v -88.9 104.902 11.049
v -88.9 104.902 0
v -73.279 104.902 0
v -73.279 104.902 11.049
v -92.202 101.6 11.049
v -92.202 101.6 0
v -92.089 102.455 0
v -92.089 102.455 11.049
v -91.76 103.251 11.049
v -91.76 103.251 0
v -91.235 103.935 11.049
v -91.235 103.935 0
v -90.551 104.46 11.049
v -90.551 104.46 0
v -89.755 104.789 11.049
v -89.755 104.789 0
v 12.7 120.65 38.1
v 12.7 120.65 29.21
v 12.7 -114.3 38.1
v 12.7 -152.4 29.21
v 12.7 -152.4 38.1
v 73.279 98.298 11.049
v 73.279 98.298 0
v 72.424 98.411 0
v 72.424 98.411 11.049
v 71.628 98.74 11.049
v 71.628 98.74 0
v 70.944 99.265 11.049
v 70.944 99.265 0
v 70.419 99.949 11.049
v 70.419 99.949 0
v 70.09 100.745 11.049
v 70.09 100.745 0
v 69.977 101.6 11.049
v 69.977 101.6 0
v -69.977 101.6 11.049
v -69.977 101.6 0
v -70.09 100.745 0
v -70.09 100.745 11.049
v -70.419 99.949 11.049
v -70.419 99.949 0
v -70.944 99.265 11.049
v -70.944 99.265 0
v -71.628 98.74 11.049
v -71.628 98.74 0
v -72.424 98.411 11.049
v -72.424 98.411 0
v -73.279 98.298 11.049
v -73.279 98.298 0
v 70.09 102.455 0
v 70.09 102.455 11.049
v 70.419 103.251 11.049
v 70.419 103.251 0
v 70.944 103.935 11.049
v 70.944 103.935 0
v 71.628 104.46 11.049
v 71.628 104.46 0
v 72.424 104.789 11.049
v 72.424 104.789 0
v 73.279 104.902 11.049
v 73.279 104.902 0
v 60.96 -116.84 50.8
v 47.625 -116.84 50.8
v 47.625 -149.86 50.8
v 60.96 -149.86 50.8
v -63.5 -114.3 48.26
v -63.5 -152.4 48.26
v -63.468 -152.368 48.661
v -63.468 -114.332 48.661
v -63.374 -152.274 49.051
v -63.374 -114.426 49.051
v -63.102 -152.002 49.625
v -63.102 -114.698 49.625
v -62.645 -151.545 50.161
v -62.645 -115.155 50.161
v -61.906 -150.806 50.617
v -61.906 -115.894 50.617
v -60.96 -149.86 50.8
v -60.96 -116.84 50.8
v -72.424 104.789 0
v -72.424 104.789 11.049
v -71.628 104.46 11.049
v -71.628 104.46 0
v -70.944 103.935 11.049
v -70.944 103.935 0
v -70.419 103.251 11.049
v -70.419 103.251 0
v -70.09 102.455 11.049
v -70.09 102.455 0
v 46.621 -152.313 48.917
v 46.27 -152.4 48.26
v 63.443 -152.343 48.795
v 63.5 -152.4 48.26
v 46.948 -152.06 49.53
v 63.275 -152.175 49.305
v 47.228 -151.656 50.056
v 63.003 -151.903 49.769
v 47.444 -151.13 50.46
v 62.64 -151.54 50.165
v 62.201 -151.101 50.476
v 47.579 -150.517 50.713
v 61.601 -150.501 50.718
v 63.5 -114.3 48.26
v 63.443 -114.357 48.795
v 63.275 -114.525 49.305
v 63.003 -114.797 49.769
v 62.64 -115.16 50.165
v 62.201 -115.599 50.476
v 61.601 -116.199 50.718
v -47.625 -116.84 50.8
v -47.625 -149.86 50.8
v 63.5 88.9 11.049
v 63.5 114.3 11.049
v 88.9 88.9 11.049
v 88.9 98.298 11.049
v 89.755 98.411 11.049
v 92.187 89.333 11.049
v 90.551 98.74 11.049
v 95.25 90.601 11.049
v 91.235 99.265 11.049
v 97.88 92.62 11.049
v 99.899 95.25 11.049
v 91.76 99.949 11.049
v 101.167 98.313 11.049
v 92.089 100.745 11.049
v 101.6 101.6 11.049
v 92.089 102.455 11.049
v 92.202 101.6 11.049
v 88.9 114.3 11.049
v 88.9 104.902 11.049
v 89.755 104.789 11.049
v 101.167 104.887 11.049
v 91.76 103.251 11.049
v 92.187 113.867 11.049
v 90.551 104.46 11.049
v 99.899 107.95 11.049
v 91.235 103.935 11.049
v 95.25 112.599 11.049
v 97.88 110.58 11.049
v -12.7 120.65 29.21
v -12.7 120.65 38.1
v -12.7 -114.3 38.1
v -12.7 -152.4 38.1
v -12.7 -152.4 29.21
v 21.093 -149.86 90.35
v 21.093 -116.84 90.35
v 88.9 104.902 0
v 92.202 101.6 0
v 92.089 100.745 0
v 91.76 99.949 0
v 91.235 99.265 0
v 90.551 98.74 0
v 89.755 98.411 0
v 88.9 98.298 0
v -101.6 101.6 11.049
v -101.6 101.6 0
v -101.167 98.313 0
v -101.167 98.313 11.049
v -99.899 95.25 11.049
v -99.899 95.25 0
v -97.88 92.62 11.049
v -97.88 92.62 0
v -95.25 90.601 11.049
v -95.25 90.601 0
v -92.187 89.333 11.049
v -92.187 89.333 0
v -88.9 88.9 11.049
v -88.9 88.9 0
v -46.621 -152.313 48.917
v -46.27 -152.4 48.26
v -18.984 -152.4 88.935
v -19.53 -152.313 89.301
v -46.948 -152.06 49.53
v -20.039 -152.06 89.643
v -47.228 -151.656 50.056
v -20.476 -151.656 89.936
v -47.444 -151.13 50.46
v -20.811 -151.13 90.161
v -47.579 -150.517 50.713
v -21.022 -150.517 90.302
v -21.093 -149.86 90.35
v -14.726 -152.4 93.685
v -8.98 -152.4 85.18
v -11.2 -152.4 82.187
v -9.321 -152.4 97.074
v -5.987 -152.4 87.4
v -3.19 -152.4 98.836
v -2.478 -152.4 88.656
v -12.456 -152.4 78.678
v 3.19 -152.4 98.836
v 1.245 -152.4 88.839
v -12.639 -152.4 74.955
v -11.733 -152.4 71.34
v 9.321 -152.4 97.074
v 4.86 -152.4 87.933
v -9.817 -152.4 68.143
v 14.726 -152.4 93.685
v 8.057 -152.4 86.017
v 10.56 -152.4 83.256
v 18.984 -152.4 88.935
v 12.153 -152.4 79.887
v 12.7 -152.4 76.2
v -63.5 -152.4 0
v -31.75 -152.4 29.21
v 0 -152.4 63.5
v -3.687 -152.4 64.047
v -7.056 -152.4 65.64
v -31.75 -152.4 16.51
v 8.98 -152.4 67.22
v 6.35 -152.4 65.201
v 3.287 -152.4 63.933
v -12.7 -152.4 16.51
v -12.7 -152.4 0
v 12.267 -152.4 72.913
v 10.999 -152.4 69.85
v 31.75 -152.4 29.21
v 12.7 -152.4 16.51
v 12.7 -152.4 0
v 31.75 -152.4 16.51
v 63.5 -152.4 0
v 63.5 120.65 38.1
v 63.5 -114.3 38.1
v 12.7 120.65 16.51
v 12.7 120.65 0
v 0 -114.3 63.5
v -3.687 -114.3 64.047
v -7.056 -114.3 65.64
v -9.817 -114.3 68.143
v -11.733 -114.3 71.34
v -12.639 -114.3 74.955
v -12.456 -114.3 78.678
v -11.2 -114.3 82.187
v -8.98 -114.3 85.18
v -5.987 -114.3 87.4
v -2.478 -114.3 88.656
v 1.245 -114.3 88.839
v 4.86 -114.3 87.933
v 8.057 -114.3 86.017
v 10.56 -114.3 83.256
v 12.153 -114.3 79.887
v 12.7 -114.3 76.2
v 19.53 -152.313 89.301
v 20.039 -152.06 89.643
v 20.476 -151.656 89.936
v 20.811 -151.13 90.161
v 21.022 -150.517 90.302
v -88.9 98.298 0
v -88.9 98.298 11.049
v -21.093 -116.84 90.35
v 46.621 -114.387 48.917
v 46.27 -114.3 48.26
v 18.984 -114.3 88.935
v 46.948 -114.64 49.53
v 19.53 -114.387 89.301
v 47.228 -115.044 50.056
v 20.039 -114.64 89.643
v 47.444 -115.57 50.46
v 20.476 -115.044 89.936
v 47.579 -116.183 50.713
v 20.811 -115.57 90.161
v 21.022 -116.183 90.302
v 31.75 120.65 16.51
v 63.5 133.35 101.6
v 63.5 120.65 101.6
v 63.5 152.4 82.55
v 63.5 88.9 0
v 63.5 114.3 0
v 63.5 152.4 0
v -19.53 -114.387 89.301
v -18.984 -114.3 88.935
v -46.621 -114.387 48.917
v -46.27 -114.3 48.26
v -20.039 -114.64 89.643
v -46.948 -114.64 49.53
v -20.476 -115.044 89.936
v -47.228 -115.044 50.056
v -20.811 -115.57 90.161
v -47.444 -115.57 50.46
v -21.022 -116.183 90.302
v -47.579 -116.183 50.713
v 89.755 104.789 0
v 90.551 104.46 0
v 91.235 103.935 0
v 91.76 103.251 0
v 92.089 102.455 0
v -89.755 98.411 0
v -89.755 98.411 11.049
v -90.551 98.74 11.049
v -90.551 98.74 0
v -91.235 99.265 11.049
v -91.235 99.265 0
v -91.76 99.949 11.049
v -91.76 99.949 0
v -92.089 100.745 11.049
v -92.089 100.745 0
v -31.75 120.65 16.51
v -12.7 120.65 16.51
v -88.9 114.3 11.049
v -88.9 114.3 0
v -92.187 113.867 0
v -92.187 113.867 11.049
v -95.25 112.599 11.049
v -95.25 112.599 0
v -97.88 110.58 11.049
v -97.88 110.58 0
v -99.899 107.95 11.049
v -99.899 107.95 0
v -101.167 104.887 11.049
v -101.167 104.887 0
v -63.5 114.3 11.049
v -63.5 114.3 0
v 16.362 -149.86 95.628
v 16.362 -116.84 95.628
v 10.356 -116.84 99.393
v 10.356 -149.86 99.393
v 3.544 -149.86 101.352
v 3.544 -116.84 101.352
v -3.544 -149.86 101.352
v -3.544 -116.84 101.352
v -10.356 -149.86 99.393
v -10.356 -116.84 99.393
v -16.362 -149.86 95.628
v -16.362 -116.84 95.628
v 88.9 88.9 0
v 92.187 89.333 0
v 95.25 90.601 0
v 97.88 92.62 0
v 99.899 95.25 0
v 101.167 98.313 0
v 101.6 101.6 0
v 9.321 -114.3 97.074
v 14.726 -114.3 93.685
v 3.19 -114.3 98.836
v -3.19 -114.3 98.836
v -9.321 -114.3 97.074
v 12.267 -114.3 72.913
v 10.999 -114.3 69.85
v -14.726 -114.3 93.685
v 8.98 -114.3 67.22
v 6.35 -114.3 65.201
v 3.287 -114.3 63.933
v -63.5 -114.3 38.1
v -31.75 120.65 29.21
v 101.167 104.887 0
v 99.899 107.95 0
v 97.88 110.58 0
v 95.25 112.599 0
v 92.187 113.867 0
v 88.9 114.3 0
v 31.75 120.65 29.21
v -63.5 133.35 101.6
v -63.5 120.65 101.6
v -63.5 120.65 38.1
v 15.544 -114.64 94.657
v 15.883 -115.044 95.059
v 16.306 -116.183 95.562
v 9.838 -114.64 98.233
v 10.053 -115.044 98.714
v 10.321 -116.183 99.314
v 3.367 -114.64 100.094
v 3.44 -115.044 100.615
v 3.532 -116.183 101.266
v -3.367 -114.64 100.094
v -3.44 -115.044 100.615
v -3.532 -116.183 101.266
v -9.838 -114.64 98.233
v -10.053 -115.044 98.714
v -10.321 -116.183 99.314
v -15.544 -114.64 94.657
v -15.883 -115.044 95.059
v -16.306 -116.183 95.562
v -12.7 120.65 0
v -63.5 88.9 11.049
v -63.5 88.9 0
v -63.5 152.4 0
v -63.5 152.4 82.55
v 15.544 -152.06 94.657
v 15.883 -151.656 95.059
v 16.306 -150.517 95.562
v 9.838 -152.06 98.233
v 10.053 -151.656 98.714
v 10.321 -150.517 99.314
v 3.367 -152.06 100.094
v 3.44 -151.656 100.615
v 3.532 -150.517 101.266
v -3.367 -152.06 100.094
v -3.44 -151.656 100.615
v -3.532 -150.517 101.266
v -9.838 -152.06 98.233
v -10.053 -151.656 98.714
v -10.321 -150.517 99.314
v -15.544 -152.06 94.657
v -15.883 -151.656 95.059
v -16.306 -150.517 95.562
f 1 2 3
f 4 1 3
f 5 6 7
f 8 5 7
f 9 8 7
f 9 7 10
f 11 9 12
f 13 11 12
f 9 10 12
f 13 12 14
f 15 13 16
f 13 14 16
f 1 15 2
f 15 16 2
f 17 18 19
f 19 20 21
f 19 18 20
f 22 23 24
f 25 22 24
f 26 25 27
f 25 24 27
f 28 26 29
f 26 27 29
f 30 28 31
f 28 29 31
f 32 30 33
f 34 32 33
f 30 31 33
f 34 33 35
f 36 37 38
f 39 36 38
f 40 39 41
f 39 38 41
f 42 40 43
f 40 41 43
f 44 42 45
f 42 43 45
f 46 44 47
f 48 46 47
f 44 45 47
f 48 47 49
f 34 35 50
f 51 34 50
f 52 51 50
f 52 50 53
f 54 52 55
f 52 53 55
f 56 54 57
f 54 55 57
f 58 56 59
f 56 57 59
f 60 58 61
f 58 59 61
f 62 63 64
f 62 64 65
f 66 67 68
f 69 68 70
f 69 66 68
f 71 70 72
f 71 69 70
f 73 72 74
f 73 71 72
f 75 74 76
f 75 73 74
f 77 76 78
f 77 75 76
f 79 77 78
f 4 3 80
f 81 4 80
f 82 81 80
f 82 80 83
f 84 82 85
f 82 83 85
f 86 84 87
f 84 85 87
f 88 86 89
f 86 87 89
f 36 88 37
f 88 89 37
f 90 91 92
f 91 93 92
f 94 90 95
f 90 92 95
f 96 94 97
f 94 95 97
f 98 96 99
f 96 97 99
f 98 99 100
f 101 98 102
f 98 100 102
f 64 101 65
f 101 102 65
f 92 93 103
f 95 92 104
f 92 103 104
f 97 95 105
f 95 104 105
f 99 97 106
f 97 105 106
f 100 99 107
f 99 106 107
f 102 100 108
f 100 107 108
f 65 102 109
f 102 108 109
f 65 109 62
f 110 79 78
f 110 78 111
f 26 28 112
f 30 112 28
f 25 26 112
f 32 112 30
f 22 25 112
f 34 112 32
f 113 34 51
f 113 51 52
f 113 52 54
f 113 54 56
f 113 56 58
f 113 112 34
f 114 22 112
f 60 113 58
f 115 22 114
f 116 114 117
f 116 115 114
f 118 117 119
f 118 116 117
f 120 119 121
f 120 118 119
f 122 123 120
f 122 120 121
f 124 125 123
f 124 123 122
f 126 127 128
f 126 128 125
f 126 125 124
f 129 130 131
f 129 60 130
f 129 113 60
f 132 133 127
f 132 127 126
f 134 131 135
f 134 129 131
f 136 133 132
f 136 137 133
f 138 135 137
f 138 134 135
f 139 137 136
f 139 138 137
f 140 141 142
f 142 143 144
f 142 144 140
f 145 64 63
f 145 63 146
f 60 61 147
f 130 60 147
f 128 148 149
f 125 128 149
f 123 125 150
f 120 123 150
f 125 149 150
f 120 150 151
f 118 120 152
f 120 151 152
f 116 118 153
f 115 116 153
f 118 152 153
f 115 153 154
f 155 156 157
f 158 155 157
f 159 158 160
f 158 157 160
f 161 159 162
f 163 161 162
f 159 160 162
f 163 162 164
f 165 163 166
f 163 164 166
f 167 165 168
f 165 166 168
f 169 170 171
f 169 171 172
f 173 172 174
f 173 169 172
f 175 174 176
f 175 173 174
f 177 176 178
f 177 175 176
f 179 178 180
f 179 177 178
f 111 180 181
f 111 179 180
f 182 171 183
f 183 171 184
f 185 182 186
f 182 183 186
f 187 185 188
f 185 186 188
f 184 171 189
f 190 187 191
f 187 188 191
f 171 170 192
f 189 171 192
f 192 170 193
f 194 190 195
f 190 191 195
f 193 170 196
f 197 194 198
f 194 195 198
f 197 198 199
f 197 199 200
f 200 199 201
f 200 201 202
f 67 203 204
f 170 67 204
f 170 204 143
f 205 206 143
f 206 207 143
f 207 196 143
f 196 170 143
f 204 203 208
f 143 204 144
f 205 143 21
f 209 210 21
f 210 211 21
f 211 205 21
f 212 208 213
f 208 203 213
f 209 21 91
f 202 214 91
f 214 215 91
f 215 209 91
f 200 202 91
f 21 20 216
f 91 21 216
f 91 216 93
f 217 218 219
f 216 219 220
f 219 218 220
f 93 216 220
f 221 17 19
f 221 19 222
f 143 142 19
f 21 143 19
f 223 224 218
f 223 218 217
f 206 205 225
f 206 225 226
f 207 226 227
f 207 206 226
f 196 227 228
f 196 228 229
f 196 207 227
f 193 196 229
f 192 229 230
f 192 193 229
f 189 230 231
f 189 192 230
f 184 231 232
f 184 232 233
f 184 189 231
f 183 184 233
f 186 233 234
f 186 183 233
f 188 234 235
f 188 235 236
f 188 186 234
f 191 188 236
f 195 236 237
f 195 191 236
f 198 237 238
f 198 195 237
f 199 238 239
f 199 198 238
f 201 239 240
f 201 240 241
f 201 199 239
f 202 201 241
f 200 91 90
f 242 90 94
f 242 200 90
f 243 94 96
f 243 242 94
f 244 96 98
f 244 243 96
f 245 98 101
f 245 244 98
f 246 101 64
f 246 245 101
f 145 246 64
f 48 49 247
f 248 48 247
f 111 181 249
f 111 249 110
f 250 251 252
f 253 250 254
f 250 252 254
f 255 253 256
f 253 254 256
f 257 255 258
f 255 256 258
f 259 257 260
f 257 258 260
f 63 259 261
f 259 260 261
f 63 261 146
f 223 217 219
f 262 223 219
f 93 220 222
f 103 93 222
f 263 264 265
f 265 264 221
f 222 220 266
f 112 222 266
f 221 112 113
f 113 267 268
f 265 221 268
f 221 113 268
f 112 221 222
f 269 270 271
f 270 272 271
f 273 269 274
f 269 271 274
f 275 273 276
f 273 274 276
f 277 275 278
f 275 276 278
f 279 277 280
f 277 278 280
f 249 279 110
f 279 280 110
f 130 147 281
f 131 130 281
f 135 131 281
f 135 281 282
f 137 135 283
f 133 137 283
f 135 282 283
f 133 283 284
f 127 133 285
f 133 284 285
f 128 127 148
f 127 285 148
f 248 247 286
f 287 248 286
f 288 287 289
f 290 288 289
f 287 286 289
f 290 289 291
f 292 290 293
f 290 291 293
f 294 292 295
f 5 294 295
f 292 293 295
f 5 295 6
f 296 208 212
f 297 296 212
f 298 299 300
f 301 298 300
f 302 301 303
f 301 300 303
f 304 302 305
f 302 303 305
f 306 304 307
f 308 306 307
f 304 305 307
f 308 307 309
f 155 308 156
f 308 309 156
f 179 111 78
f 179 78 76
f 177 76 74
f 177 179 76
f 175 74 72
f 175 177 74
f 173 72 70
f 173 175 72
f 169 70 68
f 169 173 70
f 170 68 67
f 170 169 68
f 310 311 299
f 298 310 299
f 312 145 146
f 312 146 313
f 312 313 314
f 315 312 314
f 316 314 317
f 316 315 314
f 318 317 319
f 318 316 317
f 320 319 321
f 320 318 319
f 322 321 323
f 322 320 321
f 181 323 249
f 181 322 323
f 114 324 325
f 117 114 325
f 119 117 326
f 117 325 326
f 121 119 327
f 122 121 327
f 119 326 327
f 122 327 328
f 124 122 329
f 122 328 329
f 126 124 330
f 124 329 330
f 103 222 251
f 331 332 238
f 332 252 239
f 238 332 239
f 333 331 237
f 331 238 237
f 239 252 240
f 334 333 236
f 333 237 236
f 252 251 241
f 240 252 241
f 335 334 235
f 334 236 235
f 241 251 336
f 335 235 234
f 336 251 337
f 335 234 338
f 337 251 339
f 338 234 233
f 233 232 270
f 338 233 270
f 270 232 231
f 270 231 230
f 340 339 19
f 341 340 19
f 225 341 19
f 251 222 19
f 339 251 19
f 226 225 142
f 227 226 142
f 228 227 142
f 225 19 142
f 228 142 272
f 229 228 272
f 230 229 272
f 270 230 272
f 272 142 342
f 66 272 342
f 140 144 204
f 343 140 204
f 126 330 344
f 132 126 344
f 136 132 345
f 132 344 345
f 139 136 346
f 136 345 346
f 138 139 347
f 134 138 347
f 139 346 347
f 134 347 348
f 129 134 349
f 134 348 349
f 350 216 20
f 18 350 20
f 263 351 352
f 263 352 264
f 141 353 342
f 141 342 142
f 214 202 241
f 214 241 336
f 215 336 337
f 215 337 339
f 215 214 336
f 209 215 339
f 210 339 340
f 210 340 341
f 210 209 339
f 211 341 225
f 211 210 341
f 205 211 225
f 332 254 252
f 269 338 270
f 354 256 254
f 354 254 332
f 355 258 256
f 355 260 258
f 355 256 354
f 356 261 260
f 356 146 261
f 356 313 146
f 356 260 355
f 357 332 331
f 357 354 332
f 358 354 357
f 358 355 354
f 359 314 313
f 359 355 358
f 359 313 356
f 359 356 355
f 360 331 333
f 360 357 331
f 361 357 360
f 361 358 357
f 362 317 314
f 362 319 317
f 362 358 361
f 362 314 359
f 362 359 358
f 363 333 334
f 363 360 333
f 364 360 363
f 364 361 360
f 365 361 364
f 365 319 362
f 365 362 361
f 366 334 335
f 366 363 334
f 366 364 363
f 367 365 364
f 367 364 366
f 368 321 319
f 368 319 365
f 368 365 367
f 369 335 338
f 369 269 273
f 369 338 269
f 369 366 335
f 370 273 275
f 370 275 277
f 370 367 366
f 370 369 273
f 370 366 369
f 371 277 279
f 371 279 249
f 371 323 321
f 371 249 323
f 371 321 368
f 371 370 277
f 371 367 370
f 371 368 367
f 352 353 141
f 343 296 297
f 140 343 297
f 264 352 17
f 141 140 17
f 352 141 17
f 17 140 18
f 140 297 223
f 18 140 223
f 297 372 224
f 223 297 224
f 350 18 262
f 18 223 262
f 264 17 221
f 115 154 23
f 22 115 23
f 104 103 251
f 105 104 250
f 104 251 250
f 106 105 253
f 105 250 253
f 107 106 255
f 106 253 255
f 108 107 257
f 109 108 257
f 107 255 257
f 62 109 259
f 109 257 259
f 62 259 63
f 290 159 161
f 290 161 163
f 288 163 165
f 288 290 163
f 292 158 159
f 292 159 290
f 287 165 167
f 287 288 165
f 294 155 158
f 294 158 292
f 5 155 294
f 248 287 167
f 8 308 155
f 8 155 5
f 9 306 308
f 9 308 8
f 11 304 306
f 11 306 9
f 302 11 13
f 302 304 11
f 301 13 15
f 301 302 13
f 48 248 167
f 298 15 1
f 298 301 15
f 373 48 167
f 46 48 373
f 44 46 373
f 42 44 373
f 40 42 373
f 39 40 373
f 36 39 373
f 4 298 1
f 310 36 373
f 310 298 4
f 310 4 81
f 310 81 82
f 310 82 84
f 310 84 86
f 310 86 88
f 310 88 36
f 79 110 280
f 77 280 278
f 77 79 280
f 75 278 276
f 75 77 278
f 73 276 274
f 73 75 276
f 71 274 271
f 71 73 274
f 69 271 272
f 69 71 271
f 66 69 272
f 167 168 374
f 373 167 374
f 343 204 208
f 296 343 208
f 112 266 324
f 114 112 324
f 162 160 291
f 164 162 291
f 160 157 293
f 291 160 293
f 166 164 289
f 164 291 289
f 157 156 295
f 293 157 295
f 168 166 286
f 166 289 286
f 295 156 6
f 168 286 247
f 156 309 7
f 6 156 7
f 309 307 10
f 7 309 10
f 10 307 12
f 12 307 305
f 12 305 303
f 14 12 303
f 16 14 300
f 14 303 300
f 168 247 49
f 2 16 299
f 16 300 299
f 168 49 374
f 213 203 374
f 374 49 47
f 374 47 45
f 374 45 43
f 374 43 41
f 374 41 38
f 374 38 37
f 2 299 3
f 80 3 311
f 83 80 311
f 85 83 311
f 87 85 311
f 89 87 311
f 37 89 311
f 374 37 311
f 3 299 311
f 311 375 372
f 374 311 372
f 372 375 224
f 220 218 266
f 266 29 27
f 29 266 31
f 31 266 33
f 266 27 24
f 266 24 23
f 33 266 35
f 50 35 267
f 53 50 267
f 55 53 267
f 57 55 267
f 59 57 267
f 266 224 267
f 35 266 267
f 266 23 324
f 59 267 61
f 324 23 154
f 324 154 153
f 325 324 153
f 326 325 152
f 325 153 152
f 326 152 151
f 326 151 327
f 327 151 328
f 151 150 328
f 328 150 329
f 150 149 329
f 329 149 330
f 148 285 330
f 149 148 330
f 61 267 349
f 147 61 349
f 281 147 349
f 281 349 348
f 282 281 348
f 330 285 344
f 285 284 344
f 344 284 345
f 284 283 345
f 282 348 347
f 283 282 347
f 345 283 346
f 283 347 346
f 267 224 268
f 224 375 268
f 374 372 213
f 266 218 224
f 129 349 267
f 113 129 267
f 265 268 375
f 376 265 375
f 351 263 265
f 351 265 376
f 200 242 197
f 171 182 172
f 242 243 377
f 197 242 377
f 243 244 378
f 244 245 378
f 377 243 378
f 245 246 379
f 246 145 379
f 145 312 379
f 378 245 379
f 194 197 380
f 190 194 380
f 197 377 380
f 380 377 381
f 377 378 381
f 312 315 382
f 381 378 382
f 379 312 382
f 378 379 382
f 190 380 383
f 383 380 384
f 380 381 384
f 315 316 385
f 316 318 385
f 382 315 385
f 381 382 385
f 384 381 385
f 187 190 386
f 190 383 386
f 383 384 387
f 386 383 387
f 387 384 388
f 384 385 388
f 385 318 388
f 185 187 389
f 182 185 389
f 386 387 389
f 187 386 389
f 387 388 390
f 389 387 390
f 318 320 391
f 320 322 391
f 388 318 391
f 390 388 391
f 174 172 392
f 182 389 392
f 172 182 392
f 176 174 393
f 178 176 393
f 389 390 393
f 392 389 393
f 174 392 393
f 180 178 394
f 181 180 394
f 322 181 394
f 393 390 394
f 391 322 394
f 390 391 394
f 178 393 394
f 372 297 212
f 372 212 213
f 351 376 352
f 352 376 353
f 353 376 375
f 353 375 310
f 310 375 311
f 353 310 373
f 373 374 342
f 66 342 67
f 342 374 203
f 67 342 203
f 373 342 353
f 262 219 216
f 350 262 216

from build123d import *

# Parameters (mm, degrees)
F1_DEPTH  = 38.1
F3_DEPTH  = 273.05
F4_W      = 25.4
F4_H      = 38.1
F4_W_2    = 50.8
F5_DEPTH  = 12.7
F7_DEPTH  = 38.1
F8_R      = 2.54
F10_DEPTH = 11.049
F11_DEPTH = 11.049
F12_DEPTH = 63.5
F13_SIZE  = 19.05


with BuildPart() as f1:
    # F0 (on Top) → F1 (new body)
    with BuildSketch(Plane.XY):
        Polygon((-63.5, -152.4), (63.5, -152.4), (63.5, 88.9), (63.5, 101.6), (63.5, 114.3), (63.5, 152.4), (-63.5, 152.4), (-63.5, 114.3), (-63.5, 101.6), (-63.5, 88.9), align=None)
    extrude(amount=F1_DEPTH)

    # F2 (on face) → F3 (cut)
    with BuildSketch(Plane.XZ.offset(152.4)):
        Polygon((-12.7, 0), (0, 0), (12.7, 0), (12.7, 16.51), (31.75, 16.51), (31.75, 29.21), (12.7, 29.21), (12.7, 38.1), (-12.7, 38.1), (-12.7, 29.21), (-31.75, 29.21), (-31.75, 16.51), (-12.7, 16.51), align=None)
    extrude(amount=-F3_DEPTH, mode=Mode.SUBTRACT)

    # F4 (on face) → F5 (join)
    with BuildSketch(Plane.XY.offset(38.1)):
        with Locations((0, -133.35)):
            Rectangle(F4_W, F4_H)
        with Locations((-38.1, -133.35)):
            Rectangle(F4_W_2, F4_H)
        with Locations((38.1, -133.35)):
            Rectangle(F4_W_2, F4_H)
    extrude(amount=F5_DEPTH)

    # F6 (on face) → F7 (join)
    with BuildSketch(Plane.XZ.offset(152.4)):
        with BuildLine():
            Line((-47.625, 50.8), (0, 50.8))
            Line((0, 50.8), (47.625, 50.8))
            Line((47.625, 50.8), (21.0934256055, 90.3501730104))
            ThreePointArc((21.0934256055, 90.3501730104), (0, 101.6), (-21.0934256055, 90.3501730104))
            Line((-21.0934256055, 90.3501730104), (-47.625, 50.8))
        make_face()
        with BuildLine():
            ThreePointArc((12.7, 76.2), (8.9802561211, 67.2197438789), (0, 63.5))
            ThreePointArc((0, 63.5), (-8.9802561211, 85.1802561211), (12.7, 76.2))
        make_face(mode=Mode.SUBTRACT)
    extrude(amount=-F7_DEPTH)

    # F8
    f8_edges = [f1.edges().sort_by_distance(p)[0] for p in [
        (-55.5625, -152.4, 50.8),
        (55.5625, -152.4, 50.8),
        (34.359213, -152.4, 70.575087),
        (63.5, -133.35, 50.8),
        (-55.5625, -114.3, 50.8),
        (55.5625, -114.3, 50.8),
        (34.359213, -114.3, 70.575087),
        (0, -152.4, 101.6),
        (0, -114.3, 101.6),
        (-34.359213, -152.4, 70.575087),
        (-34.359213, -114.3, 70.575087),
        (-63.5, -133.35, 50.8),
    ]]
    fillet(f8_edges, radius=F8_R)

    # F0 (on Top) → F10 (join)
    with BuildSketch(Plane.XY):
        with BuildLine():
            Line((-88.9, 88.9), (-63.5, 88.9))
            Line((-63.5, 88.9), (-63.5, 101.6))
            Line((-63.5, 101.6), (-69.977, 101.6))
            ThreePointArc((-69.977, 101.6), (-70.9441334085, 99.2651334085), (-73.279, 98.298))
            Line((-73.279, 98.298), (-76.6367705722, 98.298))
            ThreePointArc((-76.6367705722, 98.298), (-81.1748915865, 91.5196875048), (-88.9, 88.9))
        make_face()
        with BuildLine():
            Line((-69.977, 101.6), (-63.5, 101.6))
            Line((-63.5, 101.6), (-63.5, 114.3))
            Line((-63.5, 114.3), (-88.9, 114.3))
            ThreePointArc((-88.9, 114.3), (-81.1748915865, 111.6803124952), (-76.6367705722, 104.902))
            Line((-76.6367705722, 104.902), (-73.279, 104.902))
            ThreePointArc((-73.279, 104.902), (-70.9441334085, 103.9348665915), (-69.977, 101.6))
        make_face()
        with BuildLine():
            Line((-88.9, 98.298), (-88.9, 88.9))
            ThreePointArc((-88.9, 88.9), (-81.1748915865, 91.5196875048), (-76.6367705722, 98.298))
            Line((-76.6367705722, 98.298), (-88.9, 98.298))
        make_face()
        with BuildLine():
            ThreePointArc((-101.6, 101.6), (-97.8802561211, 92.6197438789), (-88.9, 88.9))
            Line((-88.9, 88.9), (-88.9, 98.298))
            ThreePointArc((-88.9, 98.298), (-91.2348665915, 99.2651334085), (-92.202, 101.6))
            Line((-92.202, 101.6), (-101.6, 101.6))
        make_face()
        with BuildLine():
            ThreePointArc((-88.9, 114.3), (-97.8802561211, 110.5802561211), (-101.6, 101.6))
            Line((-101.6, 101.6), (-92.202, 101.6))
            ThreePointArc((-92.202, 101.6), (-91.2348665915, 103.9348665915), (-88.9, 104.902))
            Line((-88.9, 104.902), (-88.9, 114.3))
        make_face()
        with BuildLine():
            ThreePointArc((-76.6367705722, 104.902), (-81.1748915865, 111.6803124952), (-88.9, 114.3))
            Line((-88.9, 114.3), (-88.9, 104.902))
            Line((-88.9, 104.902), (-76.6367705722, 104.902))
        make_face()
    extrude(amount=F10_DEPTH)

    # F0 (on Top) → F11 (join)
    with BuildSketch(Plane.XY):
        with BuildLine():
            Line((63.5, 101.6), (63.5, 88.9))
            Line((63.5, 88.9), (88.9, 88.9))
            ThreePointArc((88.9, 88.9), (81.1748915865, 91.5196875048), (76.6367705722, 98.298))
            Line((76.6367705722, 98.298), (73.279, 98.298))
            ThreePointArc((73.279, 98.298), (70.9441334085, 99.2651334085), (69.977, 101.6))
            Line((69.977, 101.6), (63.5, 101.6))
        make_face()
        with BuildLine():
            ThreePointArc((76.6367705722, 98.298), (81.1748915865, 91.5196875048), (88.9, 88.9))
            Line((88.9, 88.9), (88.9, 98.298))
            Line((88.9, 98.298), (76.6367705722, 98.298))
        make_face()
        with BuildLine():
            Line((92.202, 101.6), (101.6, 101.6))
            ThreePointArc((101.6, 101.6), (97.8802561211, 110.5802561211), (88.9, 114.3))
            Line((88.9, 114.3), (88.9, 104.902))
            ThreePointArc((88.9, 104.902), (91.2348665915, 103.9348665915), (92.202, 101.6))
        make_face()
        with BuildLine():
            Line((88.9, 98.298), (88.9, 88.9))
            ThreePointArc((88.9, 88.9), (97.8802561211, 92.6197438789), (101.6, 101.6))
            Line((101.6, 101.6), (92.202, 101.6))
            ThreePointArc((92.202, 101.6), (91.2348665915, 99.2651334085), (88.9, 98.298))
        make_face()
        with BuildLine():
            Line((88.9, 104.902), (88.9, 114.3))
            ThreePointArc((88.9, 114.3), (81.1748915865, 111.6803124952), (76.6367705722, 104.902))
            Line((76.6367705722, 104.902), (88.9, 104.902))
        make_face()
        with BuildLine():
            Line((63.5, 114.3), (63.5, 101.6))
            Line((63.5, 101.6), (69.977, 101.6))
            ThreePointArc((69.977, 101.6), (70.9441334085, 103.9348665915), (73.279, 104.902))
            Line((73.279, 104.902), (76.6367705722, 104.902))
            ThreePointArc((76.6367705722, 104.902), (81.1748915865, 111.6803124952), (88.9, 114.3))
            Line((88.9, 114.3), (63.5, 114.3))
        make_face()
    extrude(amount=F11_DEPTH)

    # F9 (on face) → F12 (join)
    with BuildSketch(Plane.XY.offset(38.1)):
        Polygon((-63.5, 120.65), (-12.7, 120.65), (12.7, 120.65), (63.5, 120.65), (63.5, 152.4), (-63.5, 152.4), align=None)
    extrude(amount=F12_DEPTH)

    # F13
    f13_edges = [f1.edges().sort_by_distance(p)[0] for p in [
        (0, 152.4, 101.6),
    ]]
    chamfer(f13_edges, length=F13_SIZE)


solid = f1.part
